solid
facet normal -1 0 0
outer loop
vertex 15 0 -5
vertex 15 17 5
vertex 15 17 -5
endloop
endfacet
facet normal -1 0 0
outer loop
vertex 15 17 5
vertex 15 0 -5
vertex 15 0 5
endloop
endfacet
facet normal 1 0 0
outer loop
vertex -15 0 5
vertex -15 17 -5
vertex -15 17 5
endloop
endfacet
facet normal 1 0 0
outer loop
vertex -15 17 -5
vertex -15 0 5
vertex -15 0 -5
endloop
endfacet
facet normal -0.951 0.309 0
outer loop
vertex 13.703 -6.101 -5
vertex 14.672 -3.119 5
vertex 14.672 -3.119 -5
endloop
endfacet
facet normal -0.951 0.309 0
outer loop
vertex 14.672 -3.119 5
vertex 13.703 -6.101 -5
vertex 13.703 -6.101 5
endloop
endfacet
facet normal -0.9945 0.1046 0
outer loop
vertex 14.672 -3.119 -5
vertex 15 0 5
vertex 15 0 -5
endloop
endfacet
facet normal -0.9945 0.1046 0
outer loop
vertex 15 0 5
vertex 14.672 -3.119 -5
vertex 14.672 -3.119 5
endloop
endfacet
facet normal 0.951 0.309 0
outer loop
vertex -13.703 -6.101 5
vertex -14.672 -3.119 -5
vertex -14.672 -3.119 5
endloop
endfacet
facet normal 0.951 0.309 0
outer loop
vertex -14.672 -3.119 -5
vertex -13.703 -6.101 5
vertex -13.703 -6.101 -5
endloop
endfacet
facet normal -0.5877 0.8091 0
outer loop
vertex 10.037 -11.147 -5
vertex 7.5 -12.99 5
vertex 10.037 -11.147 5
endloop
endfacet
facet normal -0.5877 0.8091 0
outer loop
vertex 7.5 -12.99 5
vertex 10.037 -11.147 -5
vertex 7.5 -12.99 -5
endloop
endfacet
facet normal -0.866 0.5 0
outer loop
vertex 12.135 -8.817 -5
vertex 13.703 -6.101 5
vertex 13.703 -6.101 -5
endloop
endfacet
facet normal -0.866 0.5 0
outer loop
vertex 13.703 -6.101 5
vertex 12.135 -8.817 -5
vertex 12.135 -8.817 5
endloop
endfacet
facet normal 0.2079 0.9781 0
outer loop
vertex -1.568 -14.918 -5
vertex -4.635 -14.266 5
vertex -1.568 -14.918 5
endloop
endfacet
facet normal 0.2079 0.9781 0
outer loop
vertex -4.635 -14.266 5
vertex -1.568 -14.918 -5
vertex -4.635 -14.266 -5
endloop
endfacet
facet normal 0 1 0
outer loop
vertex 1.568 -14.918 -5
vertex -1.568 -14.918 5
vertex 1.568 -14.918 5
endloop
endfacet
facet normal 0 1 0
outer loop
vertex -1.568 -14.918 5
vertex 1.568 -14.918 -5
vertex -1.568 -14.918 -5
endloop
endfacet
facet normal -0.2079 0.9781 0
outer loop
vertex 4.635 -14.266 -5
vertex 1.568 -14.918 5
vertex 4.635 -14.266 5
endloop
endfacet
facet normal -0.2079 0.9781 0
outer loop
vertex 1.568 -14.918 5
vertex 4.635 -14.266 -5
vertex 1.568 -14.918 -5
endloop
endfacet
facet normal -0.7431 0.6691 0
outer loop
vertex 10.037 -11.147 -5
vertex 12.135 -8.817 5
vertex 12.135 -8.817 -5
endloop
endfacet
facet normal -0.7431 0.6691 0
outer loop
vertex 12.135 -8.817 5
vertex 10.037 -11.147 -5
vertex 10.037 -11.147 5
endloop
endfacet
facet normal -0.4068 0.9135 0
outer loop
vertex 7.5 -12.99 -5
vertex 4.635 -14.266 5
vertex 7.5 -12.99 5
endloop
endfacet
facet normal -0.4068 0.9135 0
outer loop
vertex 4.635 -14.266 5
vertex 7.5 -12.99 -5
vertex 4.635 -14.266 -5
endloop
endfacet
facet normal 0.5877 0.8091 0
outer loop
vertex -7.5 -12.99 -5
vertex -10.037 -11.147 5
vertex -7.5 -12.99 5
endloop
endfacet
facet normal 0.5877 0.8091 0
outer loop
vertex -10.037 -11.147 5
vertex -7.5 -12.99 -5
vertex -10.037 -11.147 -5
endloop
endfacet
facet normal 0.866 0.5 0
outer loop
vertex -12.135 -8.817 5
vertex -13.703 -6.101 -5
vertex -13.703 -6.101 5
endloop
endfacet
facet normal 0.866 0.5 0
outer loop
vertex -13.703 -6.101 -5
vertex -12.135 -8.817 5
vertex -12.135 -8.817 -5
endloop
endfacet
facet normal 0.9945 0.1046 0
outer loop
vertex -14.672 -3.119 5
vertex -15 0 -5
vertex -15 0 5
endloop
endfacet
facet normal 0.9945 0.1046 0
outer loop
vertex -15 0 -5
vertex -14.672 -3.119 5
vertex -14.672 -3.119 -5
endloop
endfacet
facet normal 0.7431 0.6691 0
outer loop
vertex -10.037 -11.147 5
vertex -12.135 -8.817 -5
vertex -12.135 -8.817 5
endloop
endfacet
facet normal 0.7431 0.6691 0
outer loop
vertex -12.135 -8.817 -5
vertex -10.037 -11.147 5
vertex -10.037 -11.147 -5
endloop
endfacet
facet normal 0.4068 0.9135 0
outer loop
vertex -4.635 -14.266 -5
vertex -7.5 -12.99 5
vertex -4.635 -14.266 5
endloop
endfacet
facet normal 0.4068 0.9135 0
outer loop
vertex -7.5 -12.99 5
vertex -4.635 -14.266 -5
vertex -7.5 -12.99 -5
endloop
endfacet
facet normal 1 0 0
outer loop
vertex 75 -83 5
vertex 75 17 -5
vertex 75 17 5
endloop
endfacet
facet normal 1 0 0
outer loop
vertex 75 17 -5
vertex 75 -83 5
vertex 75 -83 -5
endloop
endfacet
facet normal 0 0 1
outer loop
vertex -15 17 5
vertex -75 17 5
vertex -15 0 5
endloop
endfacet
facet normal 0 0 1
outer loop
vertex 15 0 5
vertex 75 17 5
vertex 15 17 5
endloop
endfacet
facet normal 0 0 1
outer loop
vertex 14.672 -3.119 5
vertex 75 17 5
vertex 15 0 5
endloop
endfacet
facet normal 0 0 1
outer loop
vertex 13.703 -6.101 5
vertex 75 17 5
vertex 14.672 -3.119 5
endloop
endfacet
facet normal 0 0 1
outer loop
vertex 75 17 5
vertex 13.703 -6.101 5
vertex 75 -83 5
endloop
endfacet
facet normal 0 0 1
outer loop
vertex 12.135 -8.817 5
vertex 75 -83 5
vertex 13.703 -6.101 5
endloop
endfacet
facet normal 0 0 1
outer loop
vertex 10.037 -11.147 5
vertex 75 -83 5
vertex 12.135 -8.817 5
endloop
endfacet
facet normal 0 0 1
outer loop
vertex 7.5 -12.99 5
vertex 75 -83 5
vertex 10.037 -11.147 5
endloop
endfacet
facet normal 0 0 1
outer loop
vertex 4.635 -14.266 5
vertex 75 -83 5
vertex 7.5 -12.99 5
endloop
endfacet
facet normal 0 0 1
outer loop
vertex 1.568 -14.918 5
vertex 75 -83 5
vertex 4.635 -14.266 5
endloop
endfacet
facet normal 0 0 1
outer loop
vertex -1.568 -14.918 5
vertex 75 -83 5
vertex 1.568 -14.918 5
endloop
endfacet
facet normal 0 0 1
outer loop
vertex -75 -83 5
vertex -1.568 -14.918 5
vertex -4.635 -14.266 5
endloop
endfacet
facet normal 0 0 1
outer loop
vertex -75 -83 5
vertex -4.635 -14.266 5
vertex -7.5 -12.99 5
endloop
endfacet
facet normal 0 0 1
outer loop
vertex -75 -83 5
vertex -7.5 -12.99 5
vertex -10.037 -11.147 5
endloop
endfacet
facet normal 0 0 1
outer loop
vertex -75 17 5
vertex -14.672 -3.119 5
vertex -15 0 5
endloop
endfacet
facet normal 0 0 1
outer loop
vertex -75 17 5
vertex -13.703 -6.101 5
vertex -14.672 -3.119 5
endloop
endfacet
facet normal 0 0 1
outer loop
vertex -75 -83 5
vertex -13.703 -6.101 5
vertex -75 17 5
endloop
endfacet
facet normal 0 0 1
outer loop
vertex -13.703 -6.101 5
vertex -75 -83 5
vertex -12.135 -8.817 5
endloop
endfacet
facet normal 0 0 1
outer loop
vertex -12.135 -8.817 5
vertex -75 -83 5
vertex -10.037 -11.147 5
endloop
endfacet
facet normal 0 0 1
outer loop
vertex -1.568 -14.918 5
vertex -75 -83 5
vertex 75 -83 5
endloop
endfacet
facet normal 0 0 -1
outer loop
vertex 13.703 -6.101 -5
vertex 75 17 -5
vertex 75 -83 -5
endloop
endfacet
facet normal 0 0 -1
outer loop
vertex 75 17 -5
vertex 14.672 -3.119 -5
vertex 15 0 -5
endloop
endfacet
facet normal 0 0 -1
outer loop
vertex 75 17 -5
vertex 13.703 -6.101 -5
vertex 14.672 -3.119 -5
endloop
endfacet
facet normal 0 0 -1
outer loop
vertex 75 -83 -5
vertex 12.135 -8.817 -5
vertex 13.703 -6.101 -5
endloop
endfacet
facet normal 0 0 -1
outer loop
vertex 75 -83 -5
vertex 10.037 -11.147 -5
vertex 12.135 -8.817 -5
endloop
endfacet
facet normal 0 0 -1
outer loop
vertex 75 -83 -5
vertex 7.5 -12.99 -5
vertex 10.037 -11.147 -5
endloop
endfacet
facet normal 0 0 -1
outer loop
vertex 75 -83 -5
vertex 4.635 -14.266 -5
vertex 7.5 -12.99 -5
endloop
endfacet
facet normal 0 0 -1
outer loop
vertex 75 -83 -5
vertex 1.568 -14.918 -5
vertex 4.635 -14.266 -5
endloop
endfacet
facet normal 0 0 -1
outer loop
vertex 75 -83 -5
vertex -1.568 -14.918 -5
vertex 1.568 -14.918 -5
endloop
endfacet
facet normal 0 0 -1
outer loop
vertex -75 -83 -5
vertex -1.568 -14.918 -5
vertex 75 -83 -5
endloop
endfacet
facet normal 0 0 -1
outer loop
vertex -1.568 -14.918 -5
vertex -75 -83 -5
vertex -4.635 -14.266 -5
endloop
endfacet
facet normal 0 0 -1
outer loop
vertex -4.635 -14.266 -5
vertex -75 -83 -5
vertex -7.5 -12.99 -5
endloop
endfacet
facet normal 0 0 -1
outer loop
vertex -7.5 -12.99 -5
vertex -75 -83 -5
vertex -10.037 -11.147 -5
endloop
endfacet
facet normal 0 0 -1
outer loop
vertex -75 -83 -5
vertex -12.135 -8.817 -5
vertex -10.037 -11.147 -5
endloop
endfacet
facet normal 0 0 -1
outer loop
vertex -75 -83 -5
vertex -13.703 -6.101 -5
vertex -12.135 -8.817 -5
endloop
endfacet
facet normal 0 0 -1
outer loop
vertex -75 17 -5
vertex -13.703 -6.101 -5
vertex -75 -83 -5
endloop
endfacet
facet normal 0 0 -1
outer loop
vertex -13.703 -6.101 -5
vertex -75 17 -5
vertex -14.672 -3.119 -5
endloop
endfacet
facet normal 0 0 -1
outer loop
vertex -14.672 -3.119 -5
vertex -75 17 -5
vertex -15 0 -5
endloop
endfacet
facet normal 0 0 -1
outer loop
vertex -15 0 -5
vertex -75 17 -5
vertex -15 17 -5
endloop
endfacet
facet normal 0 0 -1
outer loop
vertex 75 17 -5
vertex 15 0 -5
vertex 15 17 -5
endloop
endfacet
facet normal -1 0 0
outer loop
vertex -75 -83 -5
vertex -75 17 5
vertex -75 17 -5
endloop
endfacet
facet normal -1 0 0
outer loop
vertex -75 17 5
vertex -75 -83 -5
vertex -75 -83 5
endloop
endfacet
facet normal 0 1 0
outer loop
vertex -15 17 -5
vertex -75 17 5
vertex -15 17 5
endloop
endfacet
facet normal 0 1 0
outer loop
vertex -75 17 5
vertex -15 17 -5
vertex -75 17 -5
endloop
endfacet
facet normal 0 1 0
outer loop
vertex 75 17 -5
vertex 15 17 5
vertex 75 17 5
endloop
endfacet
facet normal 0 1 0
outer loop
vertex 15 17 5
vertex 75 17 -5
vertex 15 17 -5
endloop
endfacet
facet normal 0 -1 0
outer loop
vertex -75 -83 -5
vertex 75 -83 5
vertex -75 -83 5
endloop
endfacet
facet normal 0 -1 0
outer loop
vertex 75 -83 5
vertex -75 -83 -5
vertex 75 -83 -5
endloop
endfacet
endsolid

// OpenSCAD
height = 10;  // 2 depth 
removalHeight = height+1;
cylinderRadius = 15;
rectangerlWith = 
    cylinderRadius*2;
rectangerlLenght = 17;
tamplateWith = 150;
tamplateLenght = 100;

/*
difference()  {cube(12, center=true); sphere(8);} //
*/

difference() {
translate([
    -tamplateWith/2,
    -tamplateLenght+
    rectangerlLenght,
    -height/2]) 
    cube(size = [
    tamplateWith,
    tamplateLenght,
    height]);
    
union(){
translate([
    -rectangerlWith/2,
    0,
    -removalHeight/2]) 
    cube(size = [
    rectangerlWith,
    rectangerlLenght+1,
    removalHeight]);
    
cylinder(
    h = removalHeight, 
    r = cylinderRadius,
    center = true);
}
}
